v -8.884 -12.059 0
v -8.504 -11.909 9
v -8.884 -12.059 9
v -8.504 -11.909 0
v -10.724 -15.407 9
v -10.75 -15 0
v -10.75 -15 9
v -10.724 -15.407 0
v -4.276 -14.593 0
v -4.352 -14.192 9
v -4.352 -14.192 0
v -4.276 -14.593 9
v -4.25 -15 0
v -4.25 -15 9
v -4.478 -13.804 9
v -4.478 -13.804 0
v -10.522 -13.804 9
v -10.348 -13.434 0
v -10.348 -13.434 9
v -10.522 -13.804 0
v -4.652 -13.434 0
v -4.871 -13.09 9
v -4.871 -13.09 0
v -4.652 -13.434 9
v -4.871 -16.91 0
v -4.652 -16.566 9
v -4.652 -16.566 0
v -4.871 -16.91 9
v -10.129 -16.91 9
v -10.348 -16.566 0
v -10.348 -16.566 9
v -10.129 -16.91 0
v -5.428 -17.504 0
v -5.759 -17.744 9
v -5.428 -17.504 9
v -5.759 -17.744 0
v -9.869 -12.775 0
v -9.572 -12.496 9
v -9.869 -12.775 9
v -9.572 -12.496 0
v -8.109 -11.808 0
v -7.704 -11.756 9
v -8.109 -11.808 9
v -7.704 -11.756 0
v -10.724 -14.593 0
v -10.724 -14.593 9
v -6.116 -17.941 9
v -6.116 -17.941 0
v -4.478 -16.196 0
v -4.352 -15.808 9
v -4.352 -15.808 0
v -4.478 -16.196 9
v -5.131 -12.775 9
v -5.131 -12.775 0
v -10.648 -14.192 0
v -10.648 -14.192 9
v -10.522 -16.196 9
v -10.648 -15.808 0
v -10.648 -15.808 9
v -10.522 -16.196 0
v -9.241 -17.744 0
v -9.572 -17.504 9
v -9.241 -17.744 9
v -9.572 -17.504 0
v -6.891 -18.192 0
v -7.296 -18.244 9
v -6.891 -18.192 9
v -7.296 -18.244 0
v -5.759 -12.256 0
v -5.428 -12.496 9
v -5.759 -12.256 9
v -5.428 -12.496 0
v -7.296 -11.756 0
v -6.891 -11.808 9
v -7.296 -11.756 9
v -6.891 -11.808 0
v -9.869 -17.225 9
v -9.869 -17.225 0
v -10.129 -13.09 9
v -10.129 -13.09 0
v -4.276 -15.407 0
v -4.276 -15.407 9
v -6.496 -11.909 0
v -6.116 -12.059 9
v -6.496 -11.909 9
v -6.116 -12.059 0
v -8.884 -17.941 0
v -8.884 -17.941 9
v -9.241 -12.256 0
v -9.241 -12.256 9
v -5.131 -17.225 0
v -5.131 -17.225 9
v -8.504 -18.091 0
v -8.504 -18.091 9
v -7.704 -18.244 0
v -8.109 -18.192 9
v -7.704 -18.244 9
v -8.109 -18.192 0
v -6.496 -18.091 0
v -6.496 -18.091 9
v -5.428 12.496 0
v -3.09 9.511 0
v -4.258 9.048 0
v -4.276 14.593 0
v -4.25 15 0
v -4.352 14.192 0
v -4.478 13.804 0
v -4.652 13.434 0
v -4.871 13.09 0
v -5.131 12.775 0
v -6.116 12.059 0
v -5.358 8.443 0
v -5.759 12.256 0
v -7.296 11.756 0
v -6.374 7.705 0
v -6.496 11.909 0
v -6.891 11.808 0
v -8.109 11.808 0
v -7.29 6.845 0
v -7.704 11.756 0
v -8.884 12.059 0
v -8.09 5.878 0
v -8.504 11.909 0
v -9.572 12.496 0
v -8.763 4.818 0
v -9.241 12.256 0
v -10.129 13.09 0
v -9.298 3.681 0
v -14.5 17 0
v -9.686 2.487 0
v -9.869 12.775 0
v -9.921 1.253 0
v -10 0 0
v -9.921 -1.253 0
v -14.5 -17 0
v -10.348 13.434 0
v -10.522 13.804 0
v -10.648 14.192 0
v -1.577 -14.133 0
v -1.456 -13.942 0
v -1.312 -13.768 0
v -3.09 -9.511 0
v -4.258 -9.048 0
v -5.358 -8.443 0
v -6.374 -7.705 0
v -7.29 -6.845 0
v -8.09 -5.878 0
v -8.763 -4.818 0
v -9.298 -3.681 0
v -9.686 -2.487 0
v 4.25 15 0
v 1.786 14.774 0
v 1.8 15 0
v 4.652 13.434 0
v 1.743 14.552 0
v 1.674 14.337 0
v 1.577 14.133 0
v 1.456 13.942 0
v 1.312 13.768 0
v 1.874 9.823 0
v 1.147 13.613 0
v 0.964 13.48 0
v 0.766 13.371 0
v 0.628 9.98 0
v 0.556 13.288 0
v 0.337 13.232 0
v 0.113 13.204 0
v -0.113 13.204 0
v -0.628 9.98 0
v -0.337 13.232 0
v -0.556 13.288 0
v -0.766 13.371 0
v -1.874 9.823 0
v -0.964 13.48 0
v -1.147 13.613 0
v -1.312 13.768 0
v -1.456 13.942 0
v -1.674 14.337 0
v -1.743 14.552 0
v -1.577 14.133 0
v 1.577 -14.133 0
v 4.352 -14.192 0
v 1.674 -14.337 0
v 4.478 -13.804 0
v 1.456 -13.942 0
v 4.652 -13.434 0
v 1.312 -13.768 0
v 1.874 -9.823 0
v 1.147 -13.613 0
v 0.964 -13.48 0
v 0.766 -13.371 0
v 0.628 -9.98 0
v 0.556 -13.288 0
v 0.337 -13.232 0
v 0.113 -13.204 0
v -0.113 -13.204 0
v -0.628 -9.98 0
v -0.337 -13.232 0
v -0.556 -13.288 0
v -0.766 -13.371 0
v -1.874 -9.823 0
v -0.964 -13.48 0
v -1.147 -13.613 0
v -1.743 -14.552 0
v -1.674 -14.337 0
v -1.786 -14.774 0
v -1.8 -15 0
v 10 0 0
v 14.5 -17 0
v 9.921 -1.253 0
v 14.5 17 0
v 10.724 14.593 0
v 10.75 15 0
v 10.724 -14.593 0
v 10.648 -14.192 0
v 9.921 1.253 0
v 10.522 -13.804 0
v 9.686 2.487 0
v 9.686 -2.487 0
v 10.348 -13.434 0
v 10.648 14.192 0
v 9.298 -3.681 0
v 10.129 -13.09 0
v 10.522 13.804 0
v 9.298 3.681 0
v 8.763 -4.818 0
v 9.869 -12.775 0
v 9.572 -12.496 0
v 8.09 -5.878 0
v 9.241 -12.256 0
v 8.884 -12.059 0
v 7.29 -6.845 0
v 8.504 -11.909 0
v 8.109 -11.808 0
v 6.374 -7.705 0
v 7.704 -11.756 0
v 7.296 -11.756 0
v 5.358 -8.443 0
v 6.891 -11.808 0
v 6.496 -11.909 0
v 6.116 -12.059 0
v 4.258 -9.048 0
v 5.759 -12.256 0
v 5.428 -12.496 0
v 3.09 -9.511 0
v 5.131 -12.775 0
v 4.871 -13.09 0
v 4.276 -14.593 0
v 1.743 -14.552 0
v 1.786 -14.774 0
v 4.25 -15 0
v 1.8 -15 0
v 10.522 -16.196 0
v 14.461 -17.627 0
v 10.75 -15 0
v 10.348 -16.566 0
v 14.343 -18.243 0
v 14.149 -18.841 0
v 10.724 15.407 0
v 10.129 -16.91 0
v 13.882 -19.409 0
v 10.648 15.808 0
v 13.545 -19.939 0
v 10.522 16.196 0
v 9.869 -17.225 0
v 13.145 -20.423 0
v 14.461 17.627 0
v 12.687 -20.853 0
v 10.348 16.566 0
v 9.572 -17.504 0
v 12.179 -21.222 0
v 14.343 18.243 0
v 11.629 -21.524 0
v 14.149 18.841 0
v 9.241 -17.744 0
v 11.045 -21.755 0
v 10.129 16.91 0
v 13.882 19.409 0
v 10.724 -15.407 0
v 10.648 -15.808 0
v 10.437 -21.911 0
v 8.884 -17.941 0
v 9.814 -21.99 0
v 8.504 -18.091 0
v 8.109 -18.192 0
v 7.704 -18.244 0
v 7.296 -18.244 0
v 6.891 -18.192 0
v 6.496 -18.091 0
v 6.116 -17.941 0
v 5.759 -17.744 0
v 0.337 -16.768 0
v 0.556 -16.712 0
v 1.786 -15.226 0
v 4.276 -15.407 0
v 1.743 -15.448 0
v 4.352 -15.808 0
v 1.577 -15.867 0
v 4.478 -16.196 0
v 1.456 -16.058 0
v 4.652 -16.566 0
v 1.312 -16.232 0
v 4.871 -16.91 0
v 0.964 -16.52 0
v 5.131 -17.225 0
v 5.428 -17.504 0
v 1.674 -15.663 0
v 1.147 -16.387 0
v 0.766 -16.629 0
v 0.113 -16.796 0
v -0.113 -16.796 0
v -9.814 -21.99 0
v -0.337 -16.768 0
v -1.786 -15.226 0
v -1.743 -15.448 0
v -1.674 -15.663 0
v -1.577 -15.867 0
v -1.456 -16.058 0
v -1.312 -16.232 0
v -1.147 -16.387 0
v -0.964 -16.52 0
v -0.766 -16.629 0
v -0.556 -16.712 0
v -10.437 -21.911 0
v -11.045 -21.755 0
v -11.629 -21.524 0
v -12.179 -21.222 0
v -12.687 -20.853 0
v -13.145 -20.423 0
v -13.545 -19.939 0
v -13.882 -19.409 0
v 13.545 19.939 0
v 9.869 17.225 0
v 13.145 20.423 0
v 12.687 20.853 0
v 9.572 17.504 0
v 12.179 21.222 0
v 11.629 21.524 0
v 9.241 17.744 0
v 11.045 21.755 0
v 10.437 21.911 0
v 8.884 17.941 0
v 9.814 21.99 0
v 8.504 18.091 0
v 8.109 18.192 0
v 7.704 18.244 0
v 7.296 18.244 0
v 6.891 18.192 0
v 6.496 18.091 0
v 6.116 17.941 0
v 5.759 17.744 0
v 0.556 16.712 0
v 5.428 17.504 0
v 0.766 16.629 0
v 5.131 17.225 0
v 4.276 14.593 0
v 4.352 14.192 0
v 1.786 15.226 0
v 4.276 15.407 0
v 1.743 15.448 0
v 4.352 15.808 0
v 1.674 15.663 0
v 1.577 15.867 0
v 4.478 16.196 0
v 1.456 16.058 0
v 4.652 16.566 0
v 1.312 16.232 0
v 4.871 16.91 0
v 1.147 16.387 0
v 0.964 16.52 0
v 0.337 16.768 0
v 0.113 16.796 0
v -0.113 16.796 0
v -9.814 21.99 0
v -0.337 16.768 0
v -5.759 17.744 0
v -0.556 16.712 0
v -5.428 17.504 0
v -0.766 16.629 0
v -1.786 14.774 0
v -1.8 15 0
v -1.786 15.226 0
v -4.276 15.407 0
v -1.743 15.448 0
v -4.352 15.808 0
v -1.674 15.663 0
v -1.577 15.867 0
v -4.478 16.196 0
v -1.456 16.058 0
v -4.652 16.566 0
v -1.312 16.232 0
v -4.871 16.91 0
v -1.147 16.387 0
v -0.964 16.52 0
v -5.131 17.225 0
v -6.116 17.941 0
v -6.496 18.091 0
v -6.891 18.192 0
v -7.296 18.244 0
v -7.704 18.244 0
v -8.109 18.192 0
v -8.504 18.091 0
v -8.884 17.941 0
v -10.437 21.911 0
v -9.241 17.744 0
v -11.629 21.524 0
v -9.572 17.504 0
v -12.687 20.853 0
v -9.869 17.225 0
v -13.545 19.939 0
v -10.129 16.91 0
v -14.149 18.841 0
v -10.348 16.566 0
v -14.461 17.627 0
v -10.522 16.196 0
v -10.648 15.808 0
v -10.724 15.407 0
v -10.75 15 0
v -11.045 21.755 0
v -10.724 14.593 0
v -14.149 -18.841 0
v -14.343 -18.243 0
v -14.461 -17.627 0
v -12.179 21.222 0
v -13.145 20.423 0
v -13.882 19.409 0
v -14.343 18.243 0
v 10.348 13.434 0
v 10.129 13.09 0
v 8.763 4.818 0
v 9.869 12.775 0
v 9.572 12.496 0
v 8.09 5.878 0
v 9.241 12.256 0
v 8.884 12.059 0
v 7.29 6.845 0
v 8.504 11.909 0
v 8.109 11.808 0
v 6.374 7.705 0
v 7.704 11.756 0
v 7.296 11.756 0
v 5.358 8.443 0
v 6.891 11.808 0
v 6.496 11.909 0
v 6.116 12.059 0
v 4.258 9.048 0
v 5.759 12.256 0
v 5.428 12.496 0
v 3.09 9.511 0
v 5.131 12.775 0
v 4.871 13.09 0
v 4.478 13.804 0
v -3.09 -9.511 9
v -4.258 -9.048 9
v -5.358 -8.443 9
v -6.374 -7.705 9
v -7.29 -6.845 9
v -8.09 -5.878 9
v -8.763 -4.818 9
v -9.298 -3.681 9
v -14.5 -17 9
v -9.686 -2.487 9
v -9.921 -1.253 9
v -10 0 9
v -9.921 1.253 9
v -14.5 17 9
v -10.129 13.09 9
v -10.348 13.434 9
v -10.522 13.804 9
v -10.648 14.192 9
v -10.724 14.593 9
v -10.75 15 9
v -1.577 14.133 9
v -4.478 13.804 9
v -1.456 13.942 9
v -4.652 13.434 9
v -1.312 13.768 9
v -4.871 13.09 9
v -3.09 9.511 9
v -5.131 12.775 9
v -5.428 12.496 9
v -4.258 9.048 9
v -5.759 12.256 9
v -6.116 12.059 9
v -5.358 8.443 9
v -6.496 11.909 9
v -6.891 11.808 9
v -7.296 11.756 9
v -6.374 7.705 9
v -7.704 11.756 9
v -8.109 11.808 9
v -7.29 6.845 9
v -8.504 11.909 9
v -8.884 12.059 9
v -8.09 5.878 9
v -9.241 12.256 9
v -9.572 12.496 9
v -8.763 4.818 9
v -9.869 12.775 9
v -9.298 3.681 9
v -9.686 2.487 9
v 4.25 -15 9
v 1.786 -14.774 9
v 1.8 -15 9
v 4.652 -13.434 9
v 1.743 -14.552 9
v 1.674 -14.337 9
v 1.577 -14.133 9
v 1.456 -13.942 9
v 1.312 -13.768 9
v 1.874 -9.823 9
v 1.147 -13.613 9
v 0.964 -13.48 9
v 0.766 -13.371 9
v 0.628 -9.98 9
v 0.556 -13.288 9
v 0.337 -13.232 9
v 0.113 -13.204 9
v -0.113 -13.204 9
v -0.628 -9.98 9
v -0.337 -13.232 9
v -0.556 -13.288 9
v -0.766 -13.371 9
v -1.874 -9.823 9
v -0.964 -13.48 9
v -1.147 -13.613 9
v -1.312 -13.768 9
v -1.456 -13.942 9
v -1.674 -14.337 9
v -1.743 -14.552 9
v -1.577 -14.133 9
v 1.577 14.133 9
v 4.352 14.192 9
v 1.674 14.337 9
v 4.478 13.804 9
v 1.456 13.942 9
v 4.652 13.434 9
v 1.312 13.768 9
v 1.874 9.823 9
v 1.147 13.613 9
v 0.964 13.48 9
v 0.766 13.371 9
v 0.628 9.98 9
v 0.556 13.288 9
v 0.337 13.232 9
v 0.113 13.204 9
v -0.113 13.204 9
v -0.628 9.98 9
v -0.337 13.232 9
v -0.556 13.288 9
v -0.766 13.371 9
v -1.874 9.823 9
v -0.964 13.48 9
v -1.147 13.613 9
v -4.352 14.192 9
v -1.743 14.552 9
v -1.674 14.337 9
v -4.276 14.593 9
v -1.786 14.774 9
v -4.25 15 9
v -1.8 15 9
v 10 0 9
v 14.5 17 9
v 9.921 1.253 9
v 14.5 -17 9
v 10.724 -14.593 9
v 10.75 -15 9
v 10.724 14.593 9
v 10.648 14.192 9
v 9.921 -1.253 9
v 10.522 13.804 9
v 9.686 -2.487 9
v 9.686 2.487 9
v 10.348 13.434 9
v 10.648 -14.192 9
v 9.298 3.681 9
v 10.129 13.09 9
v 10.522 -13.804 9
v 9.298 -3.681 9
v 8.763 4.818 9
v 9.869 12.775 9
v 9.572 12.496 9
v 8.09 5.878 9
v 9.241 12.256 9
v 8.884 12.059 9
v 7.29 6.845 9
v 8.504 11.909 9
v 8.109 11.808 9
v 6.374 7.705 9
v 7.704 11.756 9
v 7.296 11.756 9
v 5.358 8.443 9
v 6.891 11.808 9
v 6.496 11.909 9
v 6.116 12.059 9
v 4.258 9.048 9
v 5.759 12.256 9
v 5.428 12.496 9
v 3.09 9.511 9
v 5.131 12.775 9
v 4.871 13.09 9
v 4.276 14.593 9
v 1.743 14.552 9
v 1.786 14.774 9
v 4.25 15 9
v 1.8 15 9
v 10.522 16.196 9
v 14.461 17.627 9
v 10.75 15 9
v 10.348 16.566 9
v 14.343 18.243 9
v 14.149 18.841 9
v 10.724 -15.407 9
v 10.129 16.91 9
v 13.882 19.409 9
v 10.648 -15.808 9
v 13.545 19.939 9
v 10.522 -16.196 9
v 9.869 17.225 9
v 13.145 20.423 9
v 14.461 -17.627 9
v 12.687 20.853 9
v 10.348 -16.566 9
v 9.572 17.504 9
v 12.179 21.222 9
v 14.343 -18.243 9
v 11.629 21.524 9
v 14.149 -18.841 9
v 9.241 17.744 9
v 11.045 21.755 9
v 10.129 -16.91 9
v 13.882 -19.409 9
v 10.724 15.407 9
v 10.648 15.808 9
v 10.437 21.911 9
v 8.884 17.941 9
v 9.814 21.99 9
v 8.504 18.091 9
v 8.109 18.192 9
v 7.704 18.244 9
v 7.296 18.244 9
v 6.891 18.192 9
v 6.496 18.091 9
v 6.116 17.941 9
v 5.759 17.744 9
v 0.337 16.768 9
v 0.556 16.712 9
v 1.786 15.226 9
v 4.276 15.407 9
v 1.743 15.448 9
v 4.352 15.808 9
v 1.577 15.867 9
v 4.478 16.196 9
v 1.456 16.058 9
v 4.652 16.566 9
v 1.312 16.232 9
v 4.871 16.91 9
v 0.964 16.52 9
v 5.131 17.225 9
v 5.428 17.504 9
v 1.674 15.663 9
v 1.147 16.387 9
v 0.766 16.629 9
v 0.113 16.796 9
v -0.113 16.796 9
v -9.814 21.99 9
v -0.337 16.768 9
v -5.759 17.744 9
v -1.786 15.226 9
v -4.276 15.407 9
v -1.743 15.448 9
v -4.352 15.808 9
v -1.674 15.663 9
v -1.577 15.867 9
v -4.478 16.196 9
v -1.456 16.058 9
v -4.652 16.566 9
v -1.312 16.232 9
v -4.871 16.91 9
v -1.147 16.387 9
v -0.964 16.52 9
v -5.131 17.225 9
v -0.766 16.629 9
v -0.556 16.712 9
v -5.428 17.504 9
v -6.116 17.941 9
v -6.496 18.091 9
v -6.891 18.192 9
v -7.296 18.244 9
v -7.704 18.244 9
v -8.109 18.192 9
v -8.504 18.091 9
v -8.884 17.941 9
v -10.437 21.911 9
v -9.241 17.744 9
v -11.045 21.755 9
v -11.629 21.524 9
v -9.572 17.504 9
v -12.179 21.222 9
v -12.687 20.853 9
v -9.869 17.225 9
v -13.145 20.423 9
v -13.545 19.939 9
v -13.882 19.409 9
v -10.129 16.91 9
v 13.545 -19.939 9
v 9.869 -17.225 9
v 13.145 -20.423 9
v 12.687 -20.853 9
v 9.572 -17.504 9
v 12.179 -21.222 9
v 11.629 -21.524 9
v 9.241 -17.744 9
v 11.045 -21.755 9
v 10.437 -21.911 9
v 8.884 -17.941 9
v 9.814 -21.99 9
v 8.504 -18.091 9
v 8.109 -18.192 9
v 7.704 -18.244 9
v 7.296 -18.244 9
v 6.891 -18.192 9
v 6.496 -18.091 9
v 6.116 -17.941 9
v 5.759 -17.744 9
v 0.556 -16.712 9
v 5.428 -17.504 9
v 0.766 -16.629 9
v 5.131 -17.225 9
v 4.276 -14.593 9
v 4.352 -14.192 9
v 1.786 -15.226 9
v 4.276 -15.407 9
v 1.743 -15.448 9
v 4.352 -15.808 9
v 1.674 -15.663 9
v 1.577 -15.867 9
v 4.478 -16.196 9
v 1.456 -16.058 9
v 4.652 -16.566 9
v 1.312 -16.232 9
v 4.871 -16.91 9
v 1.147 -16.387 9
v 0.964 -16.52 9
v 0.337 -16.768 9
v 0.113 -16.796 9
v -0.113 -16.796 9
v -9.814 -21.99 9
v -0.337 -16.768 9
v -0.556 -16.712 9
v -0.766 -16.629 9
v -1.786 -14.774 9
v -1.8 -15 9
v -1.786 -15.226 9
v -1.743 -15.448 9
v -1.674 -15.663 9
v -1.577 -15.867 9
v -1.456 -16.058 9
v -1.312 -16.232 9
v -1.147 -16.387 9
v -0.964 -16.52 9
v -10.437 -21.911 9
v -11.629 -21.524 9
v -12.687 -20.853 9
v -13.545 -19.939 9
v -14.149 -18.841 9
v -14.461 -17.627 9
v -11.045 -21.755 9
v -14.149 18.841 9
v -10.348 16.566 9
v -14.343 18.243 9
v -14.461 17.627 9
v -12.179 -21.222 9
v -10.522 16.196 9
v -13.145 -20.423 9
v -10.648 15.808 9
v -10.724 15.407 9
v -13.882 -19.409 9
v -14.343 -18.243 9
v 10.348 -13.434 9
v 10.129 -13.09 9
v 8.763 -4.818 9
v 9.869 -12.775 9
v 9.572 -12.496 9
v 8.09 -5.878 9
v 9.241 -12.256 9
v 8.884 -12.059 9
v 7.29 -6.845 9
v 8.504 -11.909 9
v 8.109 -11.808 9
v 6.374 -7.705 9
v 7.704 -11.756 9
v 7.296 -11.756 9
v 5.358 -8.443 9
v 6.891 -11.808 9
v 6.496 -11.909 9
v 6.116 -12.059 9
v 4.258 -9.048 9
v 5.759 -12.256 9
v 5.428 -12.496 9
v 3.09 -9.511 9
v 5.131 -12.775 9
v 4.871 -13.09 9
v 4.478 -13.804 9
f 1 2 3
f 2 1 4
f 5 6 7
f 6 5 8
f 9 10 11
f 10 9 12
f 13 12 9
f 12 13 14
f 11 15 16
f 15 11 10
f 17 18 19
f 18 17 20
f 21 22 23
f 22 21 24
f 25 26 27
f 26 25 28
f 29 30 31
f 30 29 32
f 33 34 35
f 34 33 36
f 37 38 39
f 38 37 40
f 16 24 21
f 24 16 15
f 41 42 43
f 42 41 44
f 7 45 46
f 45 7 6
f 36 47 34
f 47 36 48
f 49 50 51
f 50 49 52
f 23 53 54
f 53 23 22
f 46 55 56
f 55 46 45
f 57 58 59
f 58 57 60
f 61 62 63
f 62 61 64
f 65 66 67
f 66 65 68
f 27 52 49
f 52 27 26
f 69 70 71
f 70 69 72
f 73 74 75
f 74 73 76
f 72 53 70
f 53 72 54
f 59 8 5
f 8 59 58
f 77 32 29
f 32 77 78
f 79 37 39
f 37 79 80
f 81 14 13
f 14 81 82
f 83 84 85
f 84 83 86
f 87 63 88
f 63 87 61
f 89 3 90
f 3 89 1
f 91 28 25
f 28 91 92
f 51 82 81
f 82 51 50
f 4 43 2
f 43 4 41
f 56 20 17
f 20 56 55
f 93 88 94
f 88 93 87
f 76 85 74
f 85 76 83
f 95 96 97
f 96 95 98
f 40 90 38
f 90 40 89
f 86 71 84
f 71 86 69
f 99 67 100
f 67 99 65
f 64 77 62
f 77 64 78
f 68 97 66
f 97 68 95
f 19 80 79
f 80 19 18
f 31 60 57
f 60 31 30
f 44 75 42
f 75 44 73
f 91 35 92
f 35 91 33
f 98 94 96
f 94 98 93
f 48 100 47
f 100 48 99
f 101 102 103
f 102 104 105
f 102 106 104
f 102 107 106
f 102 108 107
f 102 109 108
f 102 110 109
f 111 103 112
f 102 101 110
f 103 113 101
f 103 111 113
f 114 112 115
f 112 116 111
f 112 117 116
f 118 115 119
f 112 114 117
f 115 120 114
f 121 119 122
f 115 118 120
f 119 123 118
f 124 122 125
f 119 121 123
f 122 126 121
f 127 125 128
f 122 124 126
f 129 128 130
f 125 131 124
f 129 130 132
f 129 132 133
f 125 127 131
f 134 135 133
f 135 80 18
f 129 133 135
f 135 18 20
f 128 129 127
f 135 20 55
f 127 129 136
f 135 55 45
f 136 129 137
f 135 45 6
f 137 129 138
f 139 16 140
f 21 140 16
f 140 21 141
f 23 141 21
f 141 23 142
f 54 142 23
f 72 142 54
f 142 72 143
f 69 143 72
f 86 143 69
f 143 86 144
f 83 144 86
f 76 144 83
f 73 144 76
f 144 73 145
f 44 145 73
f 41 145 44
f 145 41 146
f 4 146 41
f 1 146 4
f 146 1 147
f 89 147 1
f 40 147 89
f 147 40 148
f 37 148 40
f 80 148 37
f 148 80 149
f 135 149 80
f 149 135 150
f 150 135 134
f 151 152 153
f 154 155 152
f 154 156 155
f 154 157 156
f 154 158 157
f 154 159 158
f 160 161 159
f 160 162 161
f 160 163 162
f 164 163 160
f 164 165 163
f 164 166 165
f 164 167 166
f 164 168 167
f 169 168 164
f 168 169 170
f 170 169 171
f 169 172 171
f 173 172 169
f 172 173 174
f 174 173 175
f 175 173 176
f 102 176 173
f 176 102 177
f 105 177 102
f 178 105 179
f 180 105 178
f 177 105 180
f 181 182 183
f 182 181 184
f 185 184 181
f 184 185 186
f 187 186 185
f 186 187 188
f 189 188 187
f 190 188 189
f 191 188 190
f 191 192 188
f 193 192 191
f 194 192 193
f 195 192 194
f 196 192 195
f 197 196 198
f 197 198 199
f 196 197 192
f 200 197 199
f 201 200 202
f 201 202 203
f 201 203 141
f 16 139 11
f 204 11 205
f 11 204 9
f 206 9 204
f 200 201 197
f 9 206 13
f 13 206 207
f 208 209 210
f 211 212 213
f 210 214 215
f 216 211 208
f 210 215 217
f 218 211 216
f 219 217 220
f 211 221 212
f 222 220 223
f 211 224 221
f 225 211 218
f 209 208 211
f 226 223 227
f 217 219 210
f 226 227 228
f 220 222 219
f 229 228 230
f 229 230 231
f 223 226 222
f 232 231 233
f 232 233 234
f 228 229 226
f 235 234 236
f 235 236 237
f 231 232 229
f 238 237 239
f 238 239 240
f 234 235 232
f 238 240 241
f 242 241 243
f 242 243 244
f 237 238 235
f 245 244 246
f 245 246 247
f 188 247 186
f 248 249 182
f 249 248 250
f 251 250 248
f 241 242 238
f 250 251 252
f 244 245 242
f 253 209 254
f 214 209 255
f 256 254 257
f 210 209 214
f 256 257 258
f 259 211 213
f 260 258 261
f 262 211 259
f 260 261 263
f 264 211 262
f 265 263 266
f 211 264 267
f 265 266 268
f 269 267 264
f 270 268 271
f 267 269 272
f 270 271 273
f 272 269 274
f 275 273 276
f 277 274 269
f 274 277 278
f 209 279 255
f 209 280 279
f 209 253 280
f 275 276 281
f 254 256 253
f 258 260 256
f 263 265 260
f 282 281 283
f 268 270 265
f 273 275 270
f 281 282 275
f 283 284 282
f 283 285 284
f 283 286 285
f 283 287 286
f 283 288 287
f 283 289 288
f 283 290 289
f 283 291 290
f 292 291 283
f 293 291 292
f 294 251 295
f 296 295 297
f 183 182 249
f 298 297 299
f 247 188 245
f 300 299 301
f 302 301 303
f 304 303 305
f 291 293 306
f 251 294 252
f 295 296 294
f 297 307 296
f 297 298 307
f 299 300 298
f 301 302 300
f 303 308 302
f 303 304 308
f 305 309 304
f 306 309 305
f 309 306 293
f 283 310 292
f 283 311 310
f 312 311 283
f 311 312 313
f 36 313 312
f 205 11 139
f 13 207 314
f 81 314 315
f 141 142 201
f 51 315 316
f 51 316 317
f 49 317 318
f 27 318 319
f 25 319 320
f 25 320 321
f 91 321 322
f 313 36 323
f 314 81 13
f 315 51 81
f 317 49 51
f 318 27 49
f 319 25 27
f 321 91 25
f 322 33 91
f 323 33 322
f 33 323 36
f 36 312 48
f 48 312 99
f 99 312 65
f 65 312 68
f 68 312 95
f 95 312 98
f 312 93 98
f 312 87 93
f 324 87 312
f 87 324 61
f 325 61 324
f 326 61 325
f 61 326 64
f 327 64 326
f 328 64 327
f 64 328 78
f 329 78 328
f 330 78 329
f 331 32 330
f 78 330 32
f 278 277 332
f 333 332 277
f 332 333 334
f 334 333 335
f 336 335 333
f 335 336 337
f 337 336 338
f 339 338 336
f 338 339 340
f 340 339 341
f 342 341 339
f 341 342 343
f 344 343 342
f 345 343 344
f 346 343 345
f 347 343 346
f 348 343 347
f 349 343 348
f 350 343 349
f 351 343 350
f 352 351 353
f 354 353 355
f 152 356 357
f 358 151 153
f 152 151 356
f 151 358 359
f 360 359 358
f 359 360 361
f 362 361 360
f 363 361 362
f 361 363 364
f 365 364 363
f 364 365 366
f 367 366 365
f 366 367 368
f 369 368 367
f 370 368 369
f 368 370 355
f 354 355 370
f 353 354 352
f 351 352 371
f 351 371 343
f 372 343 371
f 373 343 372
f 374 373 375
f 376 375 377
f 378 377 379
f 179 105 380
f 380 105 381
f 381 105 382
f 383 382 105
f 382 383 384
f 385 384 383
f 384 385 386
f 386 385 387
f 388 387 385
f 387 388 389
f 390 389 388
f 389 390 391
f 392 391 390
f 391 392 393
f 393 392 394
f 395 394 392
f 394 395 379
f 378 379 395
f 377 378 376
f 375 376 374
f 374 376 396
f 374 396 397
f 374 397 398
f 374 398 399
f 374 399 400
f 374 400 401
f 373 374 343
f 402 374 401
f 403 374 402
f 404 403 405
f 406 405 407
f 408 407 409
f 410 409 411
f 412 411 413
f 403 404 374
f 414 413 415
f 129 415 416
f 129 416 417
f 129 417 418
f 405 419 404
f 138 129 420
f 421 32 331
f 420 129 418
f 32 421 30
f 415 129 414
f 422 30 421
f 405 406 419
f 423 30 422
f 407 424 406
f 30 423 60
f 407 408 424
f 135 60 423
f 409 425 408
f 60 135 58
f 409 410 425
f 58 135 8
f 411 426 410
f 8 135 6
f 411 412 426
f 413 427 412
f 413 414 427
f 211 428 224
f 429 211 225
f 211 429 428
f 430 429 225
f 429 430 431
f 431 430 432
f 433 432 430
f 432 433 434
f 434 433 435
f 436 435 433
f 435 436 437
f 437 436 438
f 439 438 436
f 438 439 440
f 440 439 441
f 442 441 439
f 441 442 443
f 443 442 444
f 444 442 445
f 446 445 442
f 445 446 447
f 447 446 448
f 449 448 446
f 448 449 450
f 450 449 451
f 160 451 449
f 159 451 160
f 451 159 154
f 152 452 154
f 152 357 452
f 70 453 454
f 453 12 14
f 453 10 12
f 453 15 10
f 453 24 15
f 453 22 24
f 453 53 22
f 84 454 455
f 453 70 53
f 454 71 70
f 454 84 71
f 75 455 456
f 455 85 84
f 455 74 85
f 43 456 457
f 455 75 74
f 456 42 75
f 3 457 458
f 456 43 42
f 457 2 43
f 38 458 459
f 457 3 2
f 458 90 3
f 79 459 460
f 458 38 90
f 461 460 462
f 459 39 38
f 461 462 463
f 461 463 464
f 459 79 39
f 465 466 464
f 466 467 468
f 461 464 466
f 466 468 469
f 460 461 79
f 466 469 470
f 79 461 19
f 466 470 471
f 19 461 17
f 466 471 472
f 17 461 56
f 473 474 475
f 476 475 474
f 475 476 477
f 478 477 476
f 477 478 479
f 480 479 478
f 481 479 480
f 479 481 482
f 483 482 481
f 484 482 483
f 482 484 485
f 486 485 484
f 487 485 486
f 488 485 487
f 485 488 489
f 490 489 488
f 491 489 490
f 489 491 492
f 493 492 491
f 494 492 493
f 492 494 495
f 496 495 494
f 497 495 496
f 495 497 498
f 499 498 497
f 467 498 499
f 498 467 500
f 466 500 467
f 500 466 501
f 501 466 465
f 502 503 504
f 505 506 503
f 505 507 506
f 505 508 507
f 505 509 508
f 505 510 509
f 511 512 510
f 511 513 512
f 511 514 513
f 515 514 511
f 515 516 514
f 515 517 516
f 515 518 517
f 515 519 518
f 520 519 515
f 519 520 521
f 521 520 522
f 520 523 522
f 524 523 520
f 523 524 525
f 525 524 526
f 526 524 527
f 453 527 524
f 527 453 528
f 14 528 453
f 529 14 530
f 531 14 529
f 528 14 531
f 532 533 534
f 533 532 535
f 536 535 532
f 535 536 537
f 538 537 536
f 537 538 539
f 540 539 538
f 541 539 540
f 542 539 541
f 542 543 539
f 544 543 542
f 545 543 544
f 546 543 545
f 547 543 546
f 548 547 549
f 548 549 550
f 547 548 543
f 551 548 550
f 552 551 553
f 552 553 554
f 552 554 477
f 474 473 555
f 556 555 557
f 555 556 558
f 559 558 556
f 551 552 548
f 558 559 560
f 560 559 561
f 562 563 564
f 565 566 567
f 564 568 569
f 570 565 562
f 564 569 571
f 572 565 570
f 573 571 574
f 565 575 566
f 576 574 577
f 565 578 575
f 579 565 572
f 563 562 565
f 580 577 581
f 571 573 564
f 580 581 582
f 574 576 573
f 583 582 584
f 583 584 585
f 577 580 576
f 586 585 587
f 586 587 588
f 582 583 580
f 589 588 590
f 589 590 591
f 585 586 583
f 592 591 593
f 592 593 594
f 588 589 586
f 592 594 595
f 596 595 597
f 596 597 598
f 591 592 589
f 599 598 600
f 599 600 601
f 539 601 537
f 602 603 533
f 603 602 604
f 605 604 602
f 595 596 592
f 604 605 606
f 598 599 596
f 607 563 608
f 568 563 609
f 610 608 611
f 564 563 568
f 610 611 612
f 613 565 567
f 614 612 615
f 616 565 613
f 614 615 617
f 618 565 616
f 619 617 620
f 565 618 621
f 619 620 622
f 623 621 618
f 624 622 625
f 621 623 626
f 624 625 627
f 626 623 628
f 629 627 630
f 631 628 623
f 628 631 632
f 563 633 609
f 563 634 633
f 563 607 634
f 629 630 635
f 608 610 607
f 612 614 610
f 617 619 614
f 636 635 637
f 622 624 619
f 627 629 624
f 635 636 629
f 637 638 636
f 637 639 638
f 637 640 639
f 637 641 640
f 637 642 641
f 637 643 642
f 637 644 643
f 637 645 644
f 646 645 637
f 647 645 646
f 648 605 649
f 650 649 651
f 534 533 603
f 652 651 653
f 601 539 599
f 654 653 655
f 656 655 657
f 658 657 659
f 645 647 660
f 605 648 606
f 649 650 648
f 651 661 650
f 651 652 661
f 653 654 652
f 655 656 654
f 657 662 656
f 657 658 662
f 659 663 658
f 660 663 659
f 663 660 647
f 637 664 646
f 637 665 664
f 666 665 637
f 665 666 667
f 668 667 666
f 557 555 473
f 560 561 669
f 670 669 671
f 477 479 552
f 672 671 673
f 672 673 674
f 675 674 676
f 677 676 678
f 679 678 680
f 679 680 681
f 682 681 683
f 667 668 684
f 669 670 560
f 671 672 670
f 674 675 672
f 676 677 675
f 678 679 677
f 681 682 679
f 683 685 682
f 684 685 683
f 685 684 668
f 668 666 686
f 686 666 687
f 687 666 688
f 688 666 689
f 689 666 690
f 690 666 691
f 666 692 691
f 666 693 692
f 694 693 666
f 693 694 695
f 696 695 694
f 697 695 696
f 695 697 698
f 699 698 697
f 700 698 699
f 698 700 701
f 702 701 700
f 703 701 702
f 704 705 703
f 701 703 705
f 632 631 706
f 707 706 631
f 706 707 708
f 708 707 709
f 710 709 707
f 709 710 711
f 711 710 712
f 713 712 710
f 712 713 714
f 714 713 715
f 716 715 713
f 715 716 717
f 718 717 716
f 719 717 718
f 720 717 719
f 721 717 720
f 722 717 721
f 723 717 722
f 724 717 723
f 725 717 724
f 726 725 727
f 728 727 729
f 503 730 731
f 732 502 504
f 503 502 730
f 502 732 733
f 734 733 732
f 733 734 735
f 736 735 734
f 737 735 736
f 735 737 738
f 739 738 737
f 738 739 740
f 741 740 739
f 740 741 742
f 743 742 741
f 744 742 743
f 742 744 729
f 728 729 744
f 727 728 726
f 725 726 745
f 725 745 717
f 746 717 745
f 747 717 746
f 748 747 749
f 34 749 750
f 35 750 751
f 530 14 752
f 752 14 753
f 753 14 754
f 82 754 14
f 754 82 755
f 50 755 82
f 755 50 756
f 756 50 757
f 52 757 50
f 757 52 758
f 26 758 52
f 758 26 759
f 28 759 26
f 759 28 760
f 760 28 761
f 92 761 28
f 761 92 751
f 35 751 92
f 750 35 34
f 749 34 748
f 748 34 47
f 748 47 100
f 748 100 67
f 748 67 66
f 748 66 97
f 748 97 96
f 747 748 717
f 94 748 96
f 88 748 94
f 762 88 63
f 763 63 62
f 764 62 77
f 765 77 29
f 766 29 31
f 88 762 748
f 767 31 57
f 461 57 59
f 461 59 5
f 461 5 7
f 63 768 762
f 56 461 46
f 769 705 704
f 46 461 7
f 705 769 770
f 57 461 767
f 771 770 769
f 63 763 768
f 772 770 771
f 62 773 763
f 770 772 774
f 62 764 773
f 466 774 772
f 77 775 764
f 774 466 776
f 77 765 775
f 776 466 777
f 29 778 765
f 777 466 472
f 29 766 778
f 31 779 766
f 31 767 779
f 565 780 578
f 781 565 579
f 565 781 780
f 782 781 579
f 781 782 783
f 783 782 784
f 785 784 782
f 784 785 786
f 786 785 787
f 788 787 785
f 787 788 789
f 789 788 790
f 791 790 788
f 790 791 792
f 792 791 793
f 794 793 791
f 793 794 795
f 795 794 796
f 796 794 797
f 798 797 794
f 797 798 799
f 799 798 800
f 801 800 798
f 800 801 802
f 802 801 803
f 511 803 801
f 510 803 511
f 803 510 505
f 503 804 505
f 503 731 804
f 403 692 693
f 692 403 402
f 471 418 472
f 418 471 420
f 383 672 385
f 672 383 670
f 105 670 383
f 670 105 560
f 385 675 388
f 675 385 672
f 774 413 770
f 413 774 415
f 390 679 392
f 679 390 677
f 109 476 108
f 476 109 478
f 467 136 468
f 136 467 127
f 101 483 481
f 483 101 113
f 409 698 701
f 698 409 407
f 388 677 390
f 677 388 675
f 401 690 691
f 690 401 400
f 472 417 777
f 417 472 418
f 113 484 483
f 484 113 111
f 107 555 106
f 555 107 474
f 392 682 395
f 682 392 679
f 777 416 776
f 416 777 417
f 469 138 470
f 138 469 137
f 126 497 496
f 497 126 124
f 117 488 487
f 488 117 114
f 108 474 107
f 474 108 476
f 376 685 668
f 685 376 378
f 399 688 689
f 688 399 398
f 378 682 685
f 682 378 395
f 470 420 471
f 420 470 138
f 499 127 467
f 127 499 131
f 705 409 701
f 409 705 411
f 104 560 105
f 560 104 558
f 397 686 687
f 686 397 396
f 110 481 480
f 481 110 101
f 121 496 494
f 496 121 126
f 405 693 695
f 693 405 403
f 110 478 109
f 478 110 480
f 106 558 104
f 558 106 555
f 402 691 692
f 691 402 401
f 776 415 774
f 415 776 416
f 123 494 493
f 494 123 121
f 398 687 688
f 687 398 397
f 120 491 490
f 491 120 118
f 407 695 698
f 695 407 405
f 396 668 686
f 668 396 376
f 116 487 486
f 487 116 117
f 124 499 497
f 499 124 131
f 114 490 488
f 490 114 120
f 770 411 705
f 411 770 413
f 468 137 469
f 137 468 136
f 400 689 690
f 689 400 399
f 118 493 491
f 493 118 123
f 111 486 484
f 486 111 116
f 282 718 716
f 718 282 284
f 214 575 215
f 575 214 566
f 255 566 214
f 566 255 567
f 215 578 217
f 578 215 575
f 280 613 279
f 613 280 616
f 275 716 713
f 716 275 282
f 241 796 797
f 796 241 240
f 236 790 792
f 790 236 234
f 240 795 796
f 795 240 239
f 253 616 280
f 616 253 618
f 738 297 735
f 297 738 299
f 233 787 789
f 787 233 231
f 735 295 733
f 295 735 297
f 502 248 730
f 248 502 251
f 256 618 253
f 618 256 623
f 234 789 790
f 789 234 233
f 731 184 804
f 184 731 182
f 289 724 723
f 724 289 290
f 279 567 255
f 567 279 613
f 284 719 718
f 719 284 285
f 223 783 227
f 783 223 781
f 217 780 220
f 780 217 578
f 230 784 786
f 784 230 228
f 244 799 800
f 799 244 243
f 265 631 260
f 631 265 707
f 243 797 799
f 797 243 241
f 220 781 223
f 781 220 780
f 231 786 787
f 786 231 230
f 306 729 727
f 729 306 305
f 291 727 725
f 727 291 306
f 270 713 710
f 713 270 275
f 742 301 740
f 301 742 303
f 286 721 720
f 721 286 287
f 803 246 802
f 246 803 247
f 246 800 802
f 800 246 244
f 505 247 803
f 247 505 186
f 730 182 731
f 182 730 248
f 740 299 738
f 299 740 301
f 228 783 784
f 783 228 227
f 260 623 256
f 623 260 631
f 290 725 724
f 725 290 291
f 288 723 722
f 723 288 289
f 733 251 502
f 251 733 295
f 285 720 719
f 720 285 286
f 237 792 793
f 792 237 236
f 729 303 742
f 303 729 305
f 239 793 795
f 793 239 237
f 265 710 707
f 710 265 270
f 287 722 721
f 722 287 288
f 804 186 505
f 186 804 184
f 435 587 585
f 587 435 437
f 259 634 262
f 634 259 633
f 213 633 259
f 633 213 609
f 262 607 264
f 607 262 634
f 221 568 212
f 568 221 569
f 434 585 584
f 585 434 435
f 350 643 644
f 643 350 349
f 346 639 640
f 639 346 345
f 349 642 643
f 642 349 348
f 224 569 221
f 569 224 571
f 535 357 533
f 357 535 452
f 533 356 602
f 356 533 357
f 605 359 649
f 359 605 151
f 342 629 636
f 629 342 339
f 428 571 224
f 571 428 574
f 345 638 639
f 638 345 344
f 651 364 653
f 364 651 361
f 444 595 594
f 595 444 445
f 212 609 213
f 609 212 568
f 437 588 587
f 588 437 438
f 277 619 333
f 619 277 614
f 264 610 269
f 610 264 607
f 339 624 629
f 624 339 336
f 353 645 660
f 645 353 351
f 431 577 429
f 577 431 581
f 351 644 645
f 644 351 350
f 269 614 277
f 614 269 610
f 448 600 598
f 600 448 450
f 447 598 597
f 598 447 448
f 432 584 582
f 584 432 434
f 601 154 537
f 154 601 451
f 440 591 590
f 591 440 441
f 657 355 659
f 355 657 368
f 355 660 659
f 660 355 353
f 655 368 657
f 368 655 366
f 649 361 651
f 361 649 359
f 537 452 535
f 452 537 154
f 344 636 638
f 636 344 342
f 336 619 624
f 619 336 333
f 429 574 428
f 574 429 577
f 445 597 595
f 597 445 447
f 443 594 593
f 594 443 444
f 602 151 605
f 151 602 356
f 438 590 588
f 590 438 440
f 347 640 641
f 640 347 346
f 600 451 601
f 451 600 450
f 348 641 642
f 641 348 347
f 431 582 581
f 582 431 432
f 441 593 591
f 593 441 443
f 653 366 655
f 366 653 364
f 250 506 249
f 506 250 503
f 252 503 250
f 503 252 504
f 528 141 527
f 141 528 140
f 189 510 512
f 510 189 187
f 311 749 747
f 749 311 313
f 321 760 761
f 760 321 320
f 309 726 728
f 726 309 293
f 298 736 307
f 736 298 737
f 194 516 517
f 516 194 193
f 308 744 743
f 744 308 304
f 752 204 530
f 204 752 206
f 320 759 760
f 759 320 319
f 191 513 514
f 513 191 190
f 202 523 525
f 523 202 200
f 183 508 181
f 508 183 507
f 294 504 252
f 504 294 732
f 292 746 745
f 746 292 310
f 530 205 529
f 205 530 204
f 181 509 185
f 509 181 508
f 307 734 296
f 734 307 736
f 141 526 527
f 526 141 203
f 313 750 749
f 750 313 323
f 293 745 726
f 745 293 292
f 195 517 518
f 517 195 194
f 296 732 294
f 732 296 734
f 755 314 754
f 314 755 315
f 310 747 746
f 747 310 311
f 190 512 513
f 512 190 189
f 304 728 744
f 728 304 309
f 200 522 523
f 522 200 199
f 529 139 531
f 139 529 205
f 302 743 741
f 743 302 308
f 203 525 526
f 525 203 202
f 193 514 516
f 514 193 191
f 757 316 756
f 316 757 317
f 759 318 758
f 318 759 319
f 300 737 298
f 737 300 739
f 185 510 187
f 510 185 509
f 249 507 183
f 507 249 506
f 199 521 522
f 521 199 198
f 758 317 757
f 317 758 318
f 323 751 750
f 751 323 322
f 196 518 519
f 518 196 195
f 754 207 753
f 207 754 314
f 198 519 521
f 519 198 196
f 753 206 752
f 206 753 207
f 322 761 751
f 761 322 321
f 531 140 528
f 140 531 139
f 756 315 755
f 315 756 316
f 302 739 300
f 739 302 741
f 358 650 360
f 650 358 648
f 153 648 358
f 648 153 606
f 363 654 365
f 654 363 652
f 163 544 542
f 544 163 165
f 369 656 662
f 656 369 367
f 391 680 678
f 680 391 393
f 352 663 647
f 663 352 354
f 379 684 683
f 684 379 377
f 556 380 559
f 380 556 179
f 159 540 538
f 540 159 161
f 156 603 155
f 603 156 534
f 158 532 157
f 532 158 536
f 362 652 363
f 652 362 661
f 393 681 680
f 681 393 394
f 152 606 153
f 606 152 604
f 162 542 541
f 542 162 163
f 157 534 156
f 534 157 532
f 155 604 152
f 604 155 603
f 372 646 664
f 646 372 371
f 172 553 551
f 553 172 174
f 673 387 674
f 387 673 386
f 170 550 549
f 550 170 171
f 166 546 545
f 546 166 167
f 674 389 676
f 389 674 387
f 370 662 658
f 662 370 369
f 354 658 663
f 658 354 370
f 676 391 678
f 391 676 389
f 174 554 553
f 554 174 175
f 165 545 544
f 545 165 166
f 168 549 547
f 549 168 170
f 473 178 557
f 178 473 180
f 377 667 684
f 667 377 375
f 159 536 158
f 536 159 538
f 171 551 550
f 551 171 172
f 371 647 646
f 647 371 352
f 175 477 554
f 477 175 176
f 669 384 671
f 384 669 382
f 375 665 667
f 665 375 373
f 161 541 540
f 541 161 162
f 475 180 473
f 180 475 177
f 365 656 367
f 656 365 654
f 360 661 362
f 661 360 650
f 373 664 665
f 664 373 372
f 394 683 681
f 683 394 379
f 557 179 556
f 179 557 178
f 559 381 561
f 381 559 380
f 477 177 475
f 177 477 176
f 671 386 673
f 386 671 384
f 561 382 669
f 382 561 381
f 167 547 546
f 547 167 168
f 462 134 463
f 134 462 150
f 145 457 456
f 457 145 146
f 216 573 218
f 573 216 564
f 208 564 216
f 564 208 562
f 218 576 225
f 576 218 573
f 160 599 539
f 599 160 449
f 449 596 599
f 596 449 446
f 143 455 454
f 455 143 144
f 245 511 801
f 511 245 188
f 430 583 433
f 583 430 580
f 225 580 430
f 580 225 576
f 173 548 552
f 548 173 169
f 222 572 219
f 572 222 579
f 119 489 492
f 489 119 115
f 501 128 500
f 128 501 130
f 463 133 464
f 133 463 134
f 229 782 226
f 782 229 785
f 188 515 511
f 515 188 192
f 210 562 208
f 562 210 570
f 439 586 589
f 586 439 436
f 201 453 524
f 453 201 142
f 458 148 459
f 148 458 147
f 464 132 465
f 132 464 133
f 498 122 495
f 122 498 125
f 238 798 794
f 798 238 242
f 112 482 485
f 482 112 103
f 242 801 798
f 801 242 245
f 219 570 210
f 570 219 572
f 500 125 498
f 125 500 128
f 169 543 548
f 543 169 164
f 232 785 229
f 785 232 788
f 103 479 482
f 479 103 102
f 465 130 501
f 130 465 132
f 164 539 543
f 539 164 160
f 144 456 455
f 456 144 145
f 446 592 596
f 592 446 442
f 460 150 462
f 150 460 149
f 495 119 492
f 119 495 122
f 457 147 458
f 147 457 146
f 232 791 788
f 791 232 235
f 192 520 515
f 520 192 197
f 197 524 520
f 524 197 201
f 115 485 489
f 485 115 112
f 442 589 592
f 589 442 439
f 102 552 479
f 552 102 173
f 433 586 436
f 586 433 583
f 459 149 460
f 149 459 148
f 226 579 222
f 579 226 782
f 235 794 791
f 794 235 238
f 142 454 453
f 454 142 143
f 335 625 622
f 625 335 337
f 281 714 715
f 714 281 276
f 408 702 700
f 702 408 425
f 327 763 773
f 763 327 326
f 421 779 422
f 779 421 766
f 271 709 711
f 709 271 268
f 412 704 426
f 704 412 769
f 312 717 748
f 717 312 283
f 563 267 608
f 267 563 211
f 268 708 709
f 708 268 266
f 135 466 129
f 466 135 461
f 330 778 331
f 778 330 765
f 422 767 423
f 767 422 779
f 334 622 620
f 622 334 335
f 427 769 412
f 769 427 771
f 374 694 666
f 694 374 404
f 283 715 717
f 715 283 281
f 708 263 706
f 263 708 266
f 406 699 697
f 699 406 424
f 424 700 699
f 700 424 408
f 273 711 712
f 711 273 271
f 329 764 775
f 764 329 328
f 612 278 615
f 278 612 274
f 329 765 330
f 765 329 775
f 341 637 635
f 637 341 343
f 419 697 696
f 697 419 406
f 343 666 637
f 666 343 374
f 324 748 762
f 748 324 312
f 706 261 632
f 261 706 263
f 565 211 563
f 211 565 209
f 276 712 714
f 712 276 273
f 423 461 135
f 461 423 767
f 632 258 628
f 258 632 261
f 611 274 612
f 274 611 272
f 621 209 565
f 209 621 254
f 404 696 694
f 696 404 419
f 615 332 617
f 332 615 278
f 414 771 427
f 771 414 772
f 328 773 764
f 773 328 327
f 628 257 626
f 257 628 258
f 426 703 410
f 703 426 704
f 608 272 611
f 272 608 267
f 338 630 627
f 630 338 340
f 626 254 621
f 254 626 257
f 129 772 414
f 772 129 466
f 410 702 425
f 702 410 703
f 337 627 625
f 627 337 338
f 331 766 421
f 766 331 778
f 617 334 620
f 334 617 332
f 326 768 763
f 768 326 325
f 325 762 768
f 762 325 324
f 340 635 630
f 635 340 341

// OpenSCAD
$fn = 50;

difference() {
	union() {
		hull() {
			translate(v = [-9.5, 17.0, 0]) {
				cylinder(h = 9, r = 5);
			}
			translate(v = [9.5, 17.0, 0]) {
				cylinder(h = 9, r = 5);
			}
			translate(v = [-9.5, -17.0, 0]) {
				cylinder(h = 9, r = 5);
			}
			translate(v = [9.5, -17.0, 0]) {
				cylinder(h = 9, r = 5);
			}
		}
	}
	union() {
		translate(v = [-7.5, -15.0, 0]) {
			cylinder(h = 9, r = 3.25);
		}
		translate(v = [-7.5, 15.0, 0]) {
			cylinder(h = 9, r = 3.25);
		}
		translate(v = [7.5, -15.0, 0]) {
			cylinder(h = 9, r = 3.25);
		}
		translate(v = [7.5, 15.0, 0]) {
			cylinder(h = 9, r = 3.25);
		}
		translate(v = [0.0, -15.0, 0]) {
			cylinder(h = 9, r = 1.8);
		}
		translate(v = [0.0, 15.0, 0]) {
			cylinder(h = 9, r = 1.8);
		}
		cylinder(h = 9, r = 10.0);
	}
}
